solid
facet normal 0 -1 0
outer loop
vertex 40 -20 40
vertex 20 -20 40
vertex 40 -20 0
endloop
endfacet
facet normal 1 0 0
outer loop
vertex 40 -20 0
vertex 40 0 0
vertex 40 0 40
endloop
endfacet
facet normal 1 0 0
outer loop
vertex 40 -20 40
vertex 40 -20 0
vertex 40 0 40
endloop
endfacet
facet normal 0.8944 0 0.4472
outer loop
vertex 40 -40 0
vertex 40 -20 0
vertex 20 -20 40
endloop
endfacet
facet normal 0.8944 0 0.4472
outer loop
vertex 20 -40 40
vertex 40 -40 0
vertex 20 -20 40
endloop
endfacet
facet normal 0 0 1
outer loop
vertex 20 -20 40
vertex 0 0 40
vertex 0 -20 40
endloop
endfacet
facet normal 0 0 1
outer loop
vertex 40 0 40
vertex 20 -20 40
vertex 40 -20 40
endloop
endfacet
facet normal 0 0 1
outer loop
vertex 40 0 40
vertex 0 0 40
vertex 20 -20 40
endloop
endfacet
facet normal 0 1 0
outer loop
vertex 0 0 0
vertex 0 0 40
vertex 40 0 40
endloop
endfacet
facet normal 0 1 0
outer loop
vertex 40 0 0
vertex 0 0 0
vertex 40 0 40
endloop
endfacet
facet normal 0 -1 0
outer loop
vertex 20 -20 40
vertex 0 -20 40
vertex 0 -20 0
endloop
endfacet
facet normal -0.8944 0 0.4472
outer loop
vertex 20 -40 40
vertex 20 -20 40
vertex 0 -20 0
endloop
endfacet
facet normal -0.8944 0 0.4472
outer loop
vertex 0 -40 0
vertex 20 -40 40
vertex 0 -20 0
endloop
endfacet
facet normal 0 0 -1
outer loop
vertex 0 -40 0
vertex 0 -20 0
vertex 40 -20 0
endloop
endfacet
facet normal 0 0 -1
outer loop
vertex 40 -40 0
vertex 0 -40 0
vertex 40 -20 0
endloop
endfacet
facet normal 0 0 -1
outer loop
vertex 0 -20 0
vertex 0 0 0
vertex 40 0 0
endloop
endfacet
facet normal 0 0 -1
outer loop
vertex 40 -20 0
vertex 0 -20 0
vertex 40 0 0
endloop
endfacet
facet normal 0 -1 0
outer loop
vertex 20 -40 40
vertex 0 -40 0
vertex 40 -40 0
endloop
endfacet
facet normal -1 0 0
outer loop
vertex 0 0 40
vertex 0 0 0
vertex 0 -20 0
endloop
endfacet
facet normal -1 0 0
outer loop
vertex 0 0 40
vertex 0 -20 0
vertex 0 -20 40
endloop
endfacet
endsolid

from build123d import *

# Parameters (mm, degrees)
F0_W     = 40
F0_H     = 40
F1_DEPTH = 20
F3_DEPTH = 20


with BuildPart() as f1:
    # F0 (on Front) → F1 (new body)
    with BuildSketch(Plane.XZ):
        with Locations((20, 20)):
            Rectangle(F0_W, F0_H)
    extrude(amount=F1_DEPTH)

    # F2 (on face) → F3 (join)
    with BuildSketch(Plane.XZ.offset(20)):
        Polygon((20, 40), (0, 0), (40, 0), align=None)
    extrude(amount=F3_DEPTH)


solid = f1.part
